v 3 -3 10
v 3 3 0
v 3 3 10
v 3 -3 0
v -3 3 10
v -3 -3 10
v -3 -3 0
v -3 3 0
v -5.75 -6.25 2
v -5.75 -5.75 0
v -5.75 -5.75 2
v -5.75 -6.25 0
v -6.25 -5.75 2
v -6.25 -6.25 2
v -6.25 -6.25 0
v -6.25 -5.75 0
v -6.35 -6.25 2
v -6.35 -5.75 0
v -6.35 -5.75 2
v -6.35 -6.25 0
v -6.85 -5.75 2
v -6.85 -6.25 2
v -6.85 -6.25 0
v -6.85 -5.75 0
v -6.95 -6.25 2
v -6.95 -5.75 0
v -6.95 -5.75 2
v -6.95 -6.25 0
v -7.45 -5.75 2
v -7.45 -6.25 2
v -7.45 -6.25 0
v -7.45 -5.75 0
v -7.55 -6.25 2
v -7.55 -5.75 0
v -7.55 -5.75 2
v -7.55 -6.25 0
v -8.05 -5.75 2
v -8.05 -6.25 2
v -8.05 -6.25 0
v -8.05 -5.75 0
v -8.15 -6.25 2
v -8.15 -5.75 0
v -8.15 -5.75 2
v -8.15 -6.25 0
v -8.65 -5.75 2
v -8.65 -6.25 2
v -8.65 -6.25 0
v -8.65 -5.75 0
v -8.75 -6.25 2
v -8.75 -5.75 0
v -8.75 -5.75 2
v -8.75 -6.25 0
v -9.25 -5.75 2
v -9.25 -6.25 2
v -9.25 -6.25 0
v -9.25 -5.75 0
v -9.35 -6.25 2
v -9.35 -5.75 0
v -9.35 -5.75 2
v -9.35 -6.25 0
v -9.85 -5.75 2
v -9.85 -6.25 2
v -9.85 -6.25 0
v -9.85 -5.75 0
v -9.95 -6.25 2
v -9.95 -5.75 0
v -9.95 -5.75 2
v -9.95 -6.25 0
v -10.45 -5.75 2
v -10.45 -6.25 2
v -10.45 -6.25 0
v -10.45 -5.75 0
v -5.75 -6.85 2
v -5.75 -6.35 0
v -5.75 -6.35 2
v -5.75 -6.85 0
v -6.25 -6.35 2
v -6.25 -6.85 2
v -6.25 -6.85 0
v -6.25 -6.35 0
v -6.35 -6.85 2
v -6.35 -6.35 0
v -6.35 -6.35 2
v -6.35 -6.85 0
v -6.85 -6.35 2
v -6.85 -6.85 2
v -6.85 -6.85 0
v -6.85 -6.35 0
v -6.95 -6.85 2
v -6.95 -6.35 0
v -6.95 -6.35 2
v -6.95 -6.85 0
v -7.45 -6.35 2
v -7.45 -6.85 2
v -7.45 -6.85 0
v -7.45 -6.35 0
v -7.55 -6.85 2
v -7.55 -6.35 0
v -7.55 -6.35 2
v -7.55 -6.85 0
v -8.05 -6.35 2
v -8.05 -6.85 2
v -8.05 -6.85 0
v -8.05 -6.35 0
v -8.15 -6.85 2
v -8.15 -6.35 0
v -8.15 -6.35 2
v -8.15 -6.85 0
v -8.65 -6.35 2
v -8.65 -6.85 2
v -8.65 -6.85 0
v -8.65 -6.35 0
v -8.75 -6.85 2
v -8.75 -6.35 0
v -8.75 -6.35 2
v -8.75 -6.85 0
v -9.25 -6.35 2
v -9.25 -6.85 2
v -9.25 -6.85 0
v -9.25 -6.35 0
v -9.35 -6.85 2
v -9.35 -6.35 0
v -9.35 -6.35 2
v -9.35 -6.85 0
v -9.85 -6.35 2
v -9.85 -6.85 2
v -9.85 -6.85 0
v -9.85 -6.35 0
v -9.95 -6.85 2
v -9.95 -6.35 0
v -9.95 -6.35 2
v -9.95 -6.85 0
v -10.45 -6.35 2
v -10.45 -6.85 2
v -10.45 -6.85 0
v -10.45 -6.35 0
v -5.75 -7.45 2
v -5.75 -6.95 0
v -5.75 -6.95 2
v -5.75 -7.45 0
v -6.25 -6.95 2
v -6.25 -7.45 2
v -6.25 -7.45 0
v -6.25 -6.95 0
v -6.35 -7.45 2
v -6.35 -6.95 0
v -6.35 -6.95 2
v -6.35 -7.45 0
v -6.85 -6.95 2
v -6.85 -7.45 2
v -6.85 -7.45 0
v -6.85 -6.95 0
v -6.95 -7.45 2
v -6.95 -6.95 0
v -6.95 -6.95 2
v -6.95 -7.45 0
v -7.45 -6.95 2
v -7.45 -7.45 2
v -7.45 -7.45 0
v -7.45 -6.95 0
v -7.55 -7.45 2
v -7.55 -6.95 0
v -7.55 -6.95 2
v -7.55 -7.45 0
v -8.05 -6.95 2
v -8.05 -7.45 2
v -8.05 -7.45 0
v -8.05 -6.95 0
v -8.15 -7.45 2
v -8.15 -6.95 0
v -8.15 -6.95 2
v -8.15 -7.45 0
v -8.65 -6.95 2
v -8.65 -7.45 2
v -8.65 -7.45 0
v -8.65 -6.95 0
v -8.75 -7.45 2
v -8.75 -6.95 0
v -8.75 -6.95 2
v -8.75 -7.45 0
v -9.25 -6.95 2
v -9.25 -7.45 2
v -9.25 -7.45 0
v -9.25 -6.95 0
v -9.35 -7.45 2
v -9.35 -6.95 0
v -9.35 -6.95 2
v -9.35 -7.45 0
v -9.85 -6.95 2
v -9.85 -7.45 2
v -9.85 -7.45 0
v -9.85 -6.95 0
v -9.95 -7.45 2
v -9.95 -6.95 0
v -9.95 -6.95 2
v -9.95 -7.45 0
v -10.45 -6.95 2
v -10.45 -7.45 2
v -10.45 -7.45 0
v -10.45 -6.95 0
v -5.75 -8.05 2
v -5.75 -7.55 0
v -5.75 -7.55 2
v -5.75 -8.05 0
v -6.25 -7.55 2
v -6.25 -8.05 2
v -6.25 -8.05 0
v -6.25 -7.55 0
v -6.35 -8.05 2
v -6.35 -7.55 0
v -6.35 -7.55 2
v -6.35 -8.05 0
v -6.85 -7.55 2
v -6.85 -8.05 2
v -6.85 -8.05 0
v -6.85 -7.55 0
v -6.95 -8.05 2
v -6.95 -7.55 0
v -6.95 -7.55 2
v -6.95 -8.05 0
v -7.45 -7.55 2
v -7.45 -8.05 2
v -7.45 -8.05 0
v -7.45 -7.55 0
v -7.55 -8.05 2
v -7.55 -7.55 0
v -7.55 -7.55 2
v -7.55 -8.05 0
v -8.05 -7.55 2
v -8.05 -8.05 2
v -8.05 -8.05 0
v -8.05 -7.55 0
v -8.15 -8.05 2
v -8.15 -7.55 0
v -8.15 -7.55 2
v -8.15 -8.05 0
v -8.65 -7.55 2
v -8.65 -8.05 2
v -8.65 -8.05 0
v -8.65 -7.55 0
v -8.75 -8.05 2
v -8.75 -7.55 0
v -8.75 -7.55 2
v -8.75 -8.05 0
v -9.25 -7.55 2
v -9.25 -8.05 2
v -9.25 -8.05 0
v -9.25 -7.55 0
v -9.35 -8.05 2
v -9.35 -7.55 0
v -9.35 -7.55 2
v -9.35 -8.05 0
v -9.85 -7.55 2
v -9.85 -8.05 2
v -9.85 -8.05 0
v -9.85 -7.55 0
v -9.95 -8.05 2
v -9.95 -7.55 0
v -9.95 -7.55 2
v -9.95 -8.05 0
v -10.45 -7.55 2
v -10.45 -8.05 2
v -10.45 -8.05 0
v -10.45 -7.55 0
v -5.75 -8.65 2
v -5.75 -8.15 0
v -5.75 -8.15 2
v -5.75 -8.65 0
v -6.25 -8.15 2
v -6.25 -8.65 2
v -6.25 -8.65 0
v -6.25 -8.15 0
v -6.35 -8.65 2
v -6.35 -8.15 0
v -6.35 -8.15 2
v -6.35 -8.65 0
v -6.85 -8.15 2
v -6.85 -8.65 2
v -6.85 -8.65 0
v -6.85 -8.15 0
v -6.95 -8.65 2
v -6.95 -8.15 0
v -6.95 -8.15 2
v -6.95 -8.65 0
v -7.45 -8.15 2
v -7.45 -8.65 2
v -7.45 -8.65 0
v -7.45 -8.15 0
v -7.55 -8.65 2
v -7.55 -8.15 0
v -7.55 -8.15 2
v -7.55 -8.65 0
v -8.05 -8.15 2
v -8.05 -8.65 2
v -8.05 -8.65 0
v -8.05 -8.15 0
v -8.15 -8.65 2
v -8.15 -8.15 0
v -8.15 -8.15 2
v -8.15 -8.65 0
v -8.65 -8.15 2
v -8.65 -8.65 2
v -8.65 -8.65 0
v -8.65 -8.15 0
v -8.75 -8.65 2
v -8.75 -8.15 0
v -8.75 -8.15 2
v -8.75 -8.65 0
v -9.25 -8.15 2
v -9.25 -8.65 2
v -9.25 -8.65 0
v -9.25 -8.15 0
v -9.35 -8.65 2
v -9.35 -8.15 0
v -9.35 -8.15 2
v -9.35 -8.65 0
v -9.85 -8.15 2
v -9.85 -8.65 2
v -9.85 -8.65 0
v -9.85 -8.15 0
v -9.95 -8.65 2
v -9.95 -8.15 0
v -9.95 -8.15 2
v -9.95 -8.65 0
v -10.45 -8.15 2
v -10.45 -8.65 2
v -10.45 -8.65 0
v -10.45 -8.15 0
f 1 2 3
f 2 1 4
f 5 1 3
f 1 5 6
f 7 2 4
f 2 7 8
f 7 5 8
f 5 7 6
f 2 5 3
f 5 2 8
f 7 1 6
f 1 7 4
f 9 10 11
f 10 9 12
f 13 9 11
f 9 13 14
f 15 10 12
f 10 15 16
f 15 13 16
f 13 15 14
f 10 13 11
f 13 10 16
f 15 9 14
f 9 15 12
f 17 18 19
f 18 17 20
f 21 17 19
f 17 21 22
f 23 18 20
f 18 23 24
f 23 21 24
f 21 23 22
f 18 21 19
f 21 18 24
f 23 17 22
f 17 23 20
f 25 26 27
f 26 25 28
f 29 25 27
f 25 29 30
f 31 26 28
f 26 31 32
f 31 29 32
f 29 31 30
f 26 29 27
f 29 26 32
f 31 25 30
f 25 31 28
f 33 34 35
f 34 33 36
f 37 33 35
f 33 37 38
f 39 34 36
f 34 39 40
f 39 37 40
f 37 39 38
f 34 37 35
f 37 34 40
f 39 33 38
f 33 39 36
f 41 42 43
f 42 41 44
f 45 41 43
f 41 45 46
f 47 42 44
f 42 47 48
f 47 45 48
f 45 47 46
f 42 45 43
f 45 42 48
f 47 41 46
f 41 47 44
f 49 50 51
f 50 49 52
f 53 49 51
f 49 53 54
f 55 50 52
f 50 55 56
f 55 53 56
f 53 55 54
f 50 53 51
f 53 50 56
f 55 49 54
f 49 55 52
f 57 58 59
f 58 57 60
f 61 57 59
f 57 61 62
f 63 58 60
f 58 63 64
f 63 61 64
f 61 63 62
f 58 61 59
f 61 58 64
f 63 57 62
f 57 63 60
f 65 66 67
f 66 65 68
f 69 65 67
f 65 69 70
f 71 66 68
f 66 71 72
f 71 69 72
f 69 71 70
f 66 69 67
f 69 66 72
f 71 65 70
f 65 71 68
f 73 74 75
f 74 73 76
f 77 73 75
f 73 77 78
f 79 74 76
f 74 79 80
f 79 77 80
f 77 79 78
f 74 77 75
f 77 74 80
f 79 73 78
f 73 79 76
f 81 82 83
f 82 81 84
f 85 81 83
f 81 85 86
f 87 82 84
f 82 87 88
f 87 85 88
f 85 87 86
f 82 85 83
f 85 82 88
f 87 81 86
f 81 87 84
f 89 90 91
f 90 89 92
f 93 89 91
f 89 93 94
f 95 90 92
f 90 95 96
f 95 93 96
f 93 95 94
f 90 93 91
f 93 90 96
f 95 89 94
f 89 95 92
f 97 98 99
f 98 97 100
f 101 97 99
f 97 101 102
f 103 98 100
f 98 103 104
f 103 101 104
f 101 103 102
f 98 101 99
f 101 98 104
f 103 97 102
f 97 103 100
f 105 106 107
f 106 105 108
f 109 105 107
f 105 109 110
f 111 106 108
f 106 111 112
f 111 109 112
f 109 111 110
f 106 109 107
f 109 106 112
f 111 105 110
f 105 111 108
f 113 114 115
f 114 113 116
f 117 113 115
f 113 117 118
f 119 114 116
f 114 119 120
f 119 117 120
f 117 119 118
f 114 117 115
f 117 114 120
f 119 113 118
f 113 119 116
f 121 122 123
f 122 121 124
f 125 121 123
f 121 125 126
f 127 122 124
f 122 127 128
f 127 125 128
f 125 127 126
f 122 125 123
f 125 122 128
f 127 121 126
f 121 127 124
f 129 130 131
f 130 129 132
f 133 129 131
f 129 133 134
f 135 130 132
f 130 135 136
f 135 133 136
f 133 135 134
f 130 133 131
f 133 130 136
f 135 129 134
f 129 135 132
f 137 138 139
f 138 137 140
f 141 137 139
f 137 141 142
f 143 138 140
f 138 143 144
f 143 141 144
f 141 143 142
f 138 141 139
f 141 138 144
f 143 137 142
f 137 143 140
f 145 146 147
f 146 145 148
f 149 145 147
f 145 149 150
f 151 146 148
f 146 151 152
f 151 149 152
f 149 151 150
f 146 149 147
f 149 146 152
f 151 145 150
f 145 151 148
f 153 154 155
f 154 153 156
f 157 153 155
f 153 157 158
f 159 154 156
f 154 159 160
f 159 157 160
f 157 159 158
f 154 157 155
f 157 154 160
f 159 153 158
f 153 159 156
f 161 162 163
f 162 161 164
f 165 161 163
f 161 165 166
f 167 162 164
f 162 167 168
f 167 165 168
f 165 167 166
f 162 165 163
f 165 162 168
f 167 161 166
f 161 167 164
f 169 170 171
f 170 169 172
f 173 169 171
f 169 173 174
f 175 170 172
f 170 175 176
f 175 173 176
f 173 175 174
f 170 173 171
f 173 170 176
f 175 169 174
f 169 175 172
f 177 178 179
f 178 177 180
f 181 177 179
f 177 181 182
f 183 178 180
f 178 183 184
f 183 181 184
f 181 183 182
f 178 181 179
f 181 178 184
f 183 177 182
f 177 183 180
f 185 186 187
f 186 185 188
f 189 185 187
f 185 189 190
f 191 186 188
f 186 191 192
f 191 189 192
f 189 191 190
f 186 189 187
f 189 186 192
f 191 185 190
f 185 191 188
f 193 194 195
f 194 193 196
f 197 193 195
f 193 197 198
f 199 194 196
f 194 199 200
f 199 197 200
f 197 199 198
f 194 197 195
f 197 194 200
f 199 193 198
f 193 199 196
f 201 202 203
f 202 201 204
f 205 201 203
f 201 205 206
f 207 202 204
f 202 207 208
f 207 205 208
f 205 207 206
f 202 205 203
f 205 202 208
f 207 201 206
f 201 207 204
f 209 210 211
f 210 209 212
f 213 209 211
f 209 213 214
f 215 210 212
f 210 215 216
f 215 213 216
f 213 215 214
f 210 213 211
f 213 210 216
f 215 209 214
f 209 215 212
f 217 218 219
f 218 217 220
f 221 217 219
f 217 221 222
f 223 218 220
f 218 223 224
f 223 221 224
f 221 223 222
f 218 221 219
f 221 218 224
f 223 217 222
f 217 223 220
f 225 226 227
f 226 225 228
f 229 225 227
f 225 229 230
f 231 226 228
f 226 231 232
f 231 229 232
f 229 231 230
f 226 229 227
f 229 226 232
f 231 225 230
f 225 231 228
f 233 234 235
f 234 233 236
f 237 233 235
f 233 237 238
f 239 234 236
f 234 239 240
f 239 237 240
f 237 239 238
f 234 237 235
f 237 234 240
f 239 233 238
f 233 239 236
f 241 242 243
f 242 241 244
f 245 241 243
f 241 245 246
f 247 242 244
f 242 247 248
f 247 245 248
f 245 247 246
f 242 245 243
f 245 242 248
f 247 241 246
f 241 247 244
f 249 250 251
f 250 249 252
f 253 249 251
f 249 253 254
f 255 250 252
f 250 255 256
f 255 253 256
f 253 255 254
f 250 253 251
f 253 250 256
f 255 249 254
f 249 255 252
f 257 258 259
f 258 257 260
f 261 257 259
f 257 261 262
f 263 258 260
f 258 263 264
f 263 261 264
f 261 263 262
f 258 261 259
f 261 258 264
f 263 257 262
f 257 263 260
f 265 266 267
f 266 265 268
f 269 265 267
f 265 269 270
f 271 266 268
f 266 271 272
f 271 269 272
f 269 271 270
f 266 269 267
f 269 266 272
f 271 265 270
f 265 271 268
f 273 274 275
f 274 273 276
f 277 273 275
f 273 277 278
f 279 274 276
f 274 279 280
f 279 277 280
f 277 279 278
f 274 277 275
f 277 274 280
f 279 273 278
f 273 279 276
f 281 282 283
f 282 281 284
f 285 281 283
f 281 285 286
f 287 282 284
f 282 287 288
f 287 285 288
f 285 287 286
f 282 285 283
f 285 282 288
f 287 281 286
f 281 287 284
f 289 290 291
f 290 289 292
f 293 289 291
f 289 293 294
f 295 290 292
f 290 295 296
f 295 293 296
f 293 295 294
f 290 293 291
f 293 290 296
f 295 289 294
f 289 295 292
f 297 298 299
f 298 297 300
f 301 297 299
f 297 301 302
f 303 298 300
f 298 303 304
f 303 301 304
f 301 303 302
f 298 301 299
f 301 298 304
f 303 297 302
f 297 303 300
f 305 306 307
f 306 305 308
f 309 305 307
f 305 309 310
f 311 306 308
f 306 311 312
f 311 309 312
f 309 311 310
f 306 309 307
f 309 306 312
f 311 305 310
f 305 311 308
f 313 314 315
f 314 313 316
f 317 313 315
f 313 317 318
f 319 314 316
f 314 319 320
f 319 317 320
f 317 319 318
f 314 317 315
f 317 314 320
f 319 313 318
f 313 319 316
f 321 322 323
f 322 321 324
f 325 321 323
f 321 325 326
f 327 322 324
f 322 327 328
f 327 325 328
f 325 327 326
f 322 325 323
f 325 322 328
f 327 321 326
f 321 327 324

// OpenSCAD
translate([0, 0, 5]) color([0,1,0,0.9]) cube([6, 6, 10], center=true);
translate([-6.0, -6.0, 1]) color([1,0,0]) cube([0.5, 0.5, 2], center=true);
translate([-6.6, -6.0, 1]) color([1,0,0]) cube([0.5, 0.5, 2], center=true);
translate([-7.2, -6.0, 1]) color([1,0,0]) cube([0.5, 0.5, 2], center=true);
translate([-7.8, -6.0, 1]) color([1,0,0]) cube([0.5, 0.5, 2], center=true);
translate([-8.4, -6.0, 1]) color([1,0,0]) cube([0.5, 0.5, 2], center=true);
translate([-9.0, -6.0, 1]) color([1,0,0]) cube([0.5, 0.5, 2], center=true);
translate([-9.6, -6.0, 1]) color([1,0,0]) cube([0.5, 0.5, 2], center=true);
translate([-10.2, -6.0, 1]) color([1,0,0]) cube([0.5, 0.5, 2], center=true);
translate([-6.0, -6.6, 1]) color([1,0,0]) cube([0.5, 0.5, 2], center=true);
translate([-6.6, -6.6, 1]) color([1,0,0]) cube([0.5, 0.5, 2], center=true);
translate([-7.2, -6.6, 1]) color([1,0,0]) cube([0.5, 0.5, 2], center=true);
translate([-7.8, -6.6, 1]) color([1,0,0]) cube([0.5, 0.5, 2], center=true);
translate([-8.4, -6.6, 1]) color([1,0,0]) cube([0.5, 0.5, 2], center=true);
translate([-9.0, -6.6, 1]) color([1,0,0]) cube([0.5, 0.5, 2], center=true);
translate([-9.6, -6.6, 1]) color([1,0,0]) cube([0.5, 0.5, 2], center=true);
translate([-10.2, -6.6, 1]) color([1,0,0]) cube([0.5, 0.5, 2], center=true);
translate([-6.0, -7.2, 1]) color([1,0,0]) cube([0.5, 0.5, 2], center=true);
translate([-6.6, -7.2, 1]) color([1,0,0]) cube([0.5, 0.5, 2], center=true);
translate([-7.2, -7.2, 1]) color([1,0,0]) cube([0.5, 0.5, 2], center=true);
translate([-7.8, -7.2, 1]) color([1,0,0]) cube([0.5, 0.5, 2], center=true);
translate([-8.4, -7.2, 1]) color([1,0,0]) cube([0.5, 0.5, 2], center=true);
translate([-9.0, -7.2, 1]) color([1,0,0]) cube([0.5, 0.5, 2], center=true);
translate([-9.6, -7.2, 1]) color([1,0,0]) cube([0.5, 0.5, 2], center=true);
translate([-10.2, -7.2, 1]) color([1,0,0]) cube([0.5, 0.5, 2], center=true);
translate([-6.0, -7.8, 1]) color([1,0,0]) cube([0.5, 0.5, 2], center=true);
translate([-6.6, -7.8, 1]) color([1,0,0]) cube([0.5, 0.5, 2], center=true);
translate([-7.2, -7.8, 1]) color([1,0,0]) cube([0.5, 0.5, 2], center=true);
translate([-7.8, -7.8, 1]) color([1,0,0]) cube([0.5, 0.5, 2], center=true);
translate([-8.4, -7.8, 1]) color([1,0,0]) cube([0.5, 0.5, 2], center=true);
translate([-9.0, -7.8, 1]) color([1,0,0]) cube([0.5, 0.5, 2], center=true);
translate([-9.6, -7.8, 1]) color([1,0,0]) cube([0.5, 0.5, 2], center=true);
translate([-10.2, -7.8, 1]) color([1,0,0]) cube([0.5, 0.5, 2], center=true);
translate([-6.0, -8.4, 1]) color([1,0,0]) cube([0.5, 0.5, 2], center=true);
translate([-6.6, -8.4, 1]) color([1,0,0]) cube([0.5, 0.5, 2], center=true);
translate([-7.2, -8.4, 1]) color([1,0,0]) cube([0.5, 0.5, 2], center=true);
translate([-7.8, -8.4, 1]) color([1,0,0]) cube([0.5, 0.5, 2], center=true);
translate([-8.4, -8.4, 1]) color([1,0,0]) cube([0.5, 0.5, 2], center=true);
translate([-9.0, -8.4, 1]) color([1,0,0]) cube([0.5, 0.5, 2], center=true);
translate([-9.6, -8.4, 1]) color([1,0,0]) cube([0.5, 0.5, 2], center=true);
translate([-10.2, -8.4, 1]) color([1,0,0]) cube([0.5, 0.5, 2], center=true);
